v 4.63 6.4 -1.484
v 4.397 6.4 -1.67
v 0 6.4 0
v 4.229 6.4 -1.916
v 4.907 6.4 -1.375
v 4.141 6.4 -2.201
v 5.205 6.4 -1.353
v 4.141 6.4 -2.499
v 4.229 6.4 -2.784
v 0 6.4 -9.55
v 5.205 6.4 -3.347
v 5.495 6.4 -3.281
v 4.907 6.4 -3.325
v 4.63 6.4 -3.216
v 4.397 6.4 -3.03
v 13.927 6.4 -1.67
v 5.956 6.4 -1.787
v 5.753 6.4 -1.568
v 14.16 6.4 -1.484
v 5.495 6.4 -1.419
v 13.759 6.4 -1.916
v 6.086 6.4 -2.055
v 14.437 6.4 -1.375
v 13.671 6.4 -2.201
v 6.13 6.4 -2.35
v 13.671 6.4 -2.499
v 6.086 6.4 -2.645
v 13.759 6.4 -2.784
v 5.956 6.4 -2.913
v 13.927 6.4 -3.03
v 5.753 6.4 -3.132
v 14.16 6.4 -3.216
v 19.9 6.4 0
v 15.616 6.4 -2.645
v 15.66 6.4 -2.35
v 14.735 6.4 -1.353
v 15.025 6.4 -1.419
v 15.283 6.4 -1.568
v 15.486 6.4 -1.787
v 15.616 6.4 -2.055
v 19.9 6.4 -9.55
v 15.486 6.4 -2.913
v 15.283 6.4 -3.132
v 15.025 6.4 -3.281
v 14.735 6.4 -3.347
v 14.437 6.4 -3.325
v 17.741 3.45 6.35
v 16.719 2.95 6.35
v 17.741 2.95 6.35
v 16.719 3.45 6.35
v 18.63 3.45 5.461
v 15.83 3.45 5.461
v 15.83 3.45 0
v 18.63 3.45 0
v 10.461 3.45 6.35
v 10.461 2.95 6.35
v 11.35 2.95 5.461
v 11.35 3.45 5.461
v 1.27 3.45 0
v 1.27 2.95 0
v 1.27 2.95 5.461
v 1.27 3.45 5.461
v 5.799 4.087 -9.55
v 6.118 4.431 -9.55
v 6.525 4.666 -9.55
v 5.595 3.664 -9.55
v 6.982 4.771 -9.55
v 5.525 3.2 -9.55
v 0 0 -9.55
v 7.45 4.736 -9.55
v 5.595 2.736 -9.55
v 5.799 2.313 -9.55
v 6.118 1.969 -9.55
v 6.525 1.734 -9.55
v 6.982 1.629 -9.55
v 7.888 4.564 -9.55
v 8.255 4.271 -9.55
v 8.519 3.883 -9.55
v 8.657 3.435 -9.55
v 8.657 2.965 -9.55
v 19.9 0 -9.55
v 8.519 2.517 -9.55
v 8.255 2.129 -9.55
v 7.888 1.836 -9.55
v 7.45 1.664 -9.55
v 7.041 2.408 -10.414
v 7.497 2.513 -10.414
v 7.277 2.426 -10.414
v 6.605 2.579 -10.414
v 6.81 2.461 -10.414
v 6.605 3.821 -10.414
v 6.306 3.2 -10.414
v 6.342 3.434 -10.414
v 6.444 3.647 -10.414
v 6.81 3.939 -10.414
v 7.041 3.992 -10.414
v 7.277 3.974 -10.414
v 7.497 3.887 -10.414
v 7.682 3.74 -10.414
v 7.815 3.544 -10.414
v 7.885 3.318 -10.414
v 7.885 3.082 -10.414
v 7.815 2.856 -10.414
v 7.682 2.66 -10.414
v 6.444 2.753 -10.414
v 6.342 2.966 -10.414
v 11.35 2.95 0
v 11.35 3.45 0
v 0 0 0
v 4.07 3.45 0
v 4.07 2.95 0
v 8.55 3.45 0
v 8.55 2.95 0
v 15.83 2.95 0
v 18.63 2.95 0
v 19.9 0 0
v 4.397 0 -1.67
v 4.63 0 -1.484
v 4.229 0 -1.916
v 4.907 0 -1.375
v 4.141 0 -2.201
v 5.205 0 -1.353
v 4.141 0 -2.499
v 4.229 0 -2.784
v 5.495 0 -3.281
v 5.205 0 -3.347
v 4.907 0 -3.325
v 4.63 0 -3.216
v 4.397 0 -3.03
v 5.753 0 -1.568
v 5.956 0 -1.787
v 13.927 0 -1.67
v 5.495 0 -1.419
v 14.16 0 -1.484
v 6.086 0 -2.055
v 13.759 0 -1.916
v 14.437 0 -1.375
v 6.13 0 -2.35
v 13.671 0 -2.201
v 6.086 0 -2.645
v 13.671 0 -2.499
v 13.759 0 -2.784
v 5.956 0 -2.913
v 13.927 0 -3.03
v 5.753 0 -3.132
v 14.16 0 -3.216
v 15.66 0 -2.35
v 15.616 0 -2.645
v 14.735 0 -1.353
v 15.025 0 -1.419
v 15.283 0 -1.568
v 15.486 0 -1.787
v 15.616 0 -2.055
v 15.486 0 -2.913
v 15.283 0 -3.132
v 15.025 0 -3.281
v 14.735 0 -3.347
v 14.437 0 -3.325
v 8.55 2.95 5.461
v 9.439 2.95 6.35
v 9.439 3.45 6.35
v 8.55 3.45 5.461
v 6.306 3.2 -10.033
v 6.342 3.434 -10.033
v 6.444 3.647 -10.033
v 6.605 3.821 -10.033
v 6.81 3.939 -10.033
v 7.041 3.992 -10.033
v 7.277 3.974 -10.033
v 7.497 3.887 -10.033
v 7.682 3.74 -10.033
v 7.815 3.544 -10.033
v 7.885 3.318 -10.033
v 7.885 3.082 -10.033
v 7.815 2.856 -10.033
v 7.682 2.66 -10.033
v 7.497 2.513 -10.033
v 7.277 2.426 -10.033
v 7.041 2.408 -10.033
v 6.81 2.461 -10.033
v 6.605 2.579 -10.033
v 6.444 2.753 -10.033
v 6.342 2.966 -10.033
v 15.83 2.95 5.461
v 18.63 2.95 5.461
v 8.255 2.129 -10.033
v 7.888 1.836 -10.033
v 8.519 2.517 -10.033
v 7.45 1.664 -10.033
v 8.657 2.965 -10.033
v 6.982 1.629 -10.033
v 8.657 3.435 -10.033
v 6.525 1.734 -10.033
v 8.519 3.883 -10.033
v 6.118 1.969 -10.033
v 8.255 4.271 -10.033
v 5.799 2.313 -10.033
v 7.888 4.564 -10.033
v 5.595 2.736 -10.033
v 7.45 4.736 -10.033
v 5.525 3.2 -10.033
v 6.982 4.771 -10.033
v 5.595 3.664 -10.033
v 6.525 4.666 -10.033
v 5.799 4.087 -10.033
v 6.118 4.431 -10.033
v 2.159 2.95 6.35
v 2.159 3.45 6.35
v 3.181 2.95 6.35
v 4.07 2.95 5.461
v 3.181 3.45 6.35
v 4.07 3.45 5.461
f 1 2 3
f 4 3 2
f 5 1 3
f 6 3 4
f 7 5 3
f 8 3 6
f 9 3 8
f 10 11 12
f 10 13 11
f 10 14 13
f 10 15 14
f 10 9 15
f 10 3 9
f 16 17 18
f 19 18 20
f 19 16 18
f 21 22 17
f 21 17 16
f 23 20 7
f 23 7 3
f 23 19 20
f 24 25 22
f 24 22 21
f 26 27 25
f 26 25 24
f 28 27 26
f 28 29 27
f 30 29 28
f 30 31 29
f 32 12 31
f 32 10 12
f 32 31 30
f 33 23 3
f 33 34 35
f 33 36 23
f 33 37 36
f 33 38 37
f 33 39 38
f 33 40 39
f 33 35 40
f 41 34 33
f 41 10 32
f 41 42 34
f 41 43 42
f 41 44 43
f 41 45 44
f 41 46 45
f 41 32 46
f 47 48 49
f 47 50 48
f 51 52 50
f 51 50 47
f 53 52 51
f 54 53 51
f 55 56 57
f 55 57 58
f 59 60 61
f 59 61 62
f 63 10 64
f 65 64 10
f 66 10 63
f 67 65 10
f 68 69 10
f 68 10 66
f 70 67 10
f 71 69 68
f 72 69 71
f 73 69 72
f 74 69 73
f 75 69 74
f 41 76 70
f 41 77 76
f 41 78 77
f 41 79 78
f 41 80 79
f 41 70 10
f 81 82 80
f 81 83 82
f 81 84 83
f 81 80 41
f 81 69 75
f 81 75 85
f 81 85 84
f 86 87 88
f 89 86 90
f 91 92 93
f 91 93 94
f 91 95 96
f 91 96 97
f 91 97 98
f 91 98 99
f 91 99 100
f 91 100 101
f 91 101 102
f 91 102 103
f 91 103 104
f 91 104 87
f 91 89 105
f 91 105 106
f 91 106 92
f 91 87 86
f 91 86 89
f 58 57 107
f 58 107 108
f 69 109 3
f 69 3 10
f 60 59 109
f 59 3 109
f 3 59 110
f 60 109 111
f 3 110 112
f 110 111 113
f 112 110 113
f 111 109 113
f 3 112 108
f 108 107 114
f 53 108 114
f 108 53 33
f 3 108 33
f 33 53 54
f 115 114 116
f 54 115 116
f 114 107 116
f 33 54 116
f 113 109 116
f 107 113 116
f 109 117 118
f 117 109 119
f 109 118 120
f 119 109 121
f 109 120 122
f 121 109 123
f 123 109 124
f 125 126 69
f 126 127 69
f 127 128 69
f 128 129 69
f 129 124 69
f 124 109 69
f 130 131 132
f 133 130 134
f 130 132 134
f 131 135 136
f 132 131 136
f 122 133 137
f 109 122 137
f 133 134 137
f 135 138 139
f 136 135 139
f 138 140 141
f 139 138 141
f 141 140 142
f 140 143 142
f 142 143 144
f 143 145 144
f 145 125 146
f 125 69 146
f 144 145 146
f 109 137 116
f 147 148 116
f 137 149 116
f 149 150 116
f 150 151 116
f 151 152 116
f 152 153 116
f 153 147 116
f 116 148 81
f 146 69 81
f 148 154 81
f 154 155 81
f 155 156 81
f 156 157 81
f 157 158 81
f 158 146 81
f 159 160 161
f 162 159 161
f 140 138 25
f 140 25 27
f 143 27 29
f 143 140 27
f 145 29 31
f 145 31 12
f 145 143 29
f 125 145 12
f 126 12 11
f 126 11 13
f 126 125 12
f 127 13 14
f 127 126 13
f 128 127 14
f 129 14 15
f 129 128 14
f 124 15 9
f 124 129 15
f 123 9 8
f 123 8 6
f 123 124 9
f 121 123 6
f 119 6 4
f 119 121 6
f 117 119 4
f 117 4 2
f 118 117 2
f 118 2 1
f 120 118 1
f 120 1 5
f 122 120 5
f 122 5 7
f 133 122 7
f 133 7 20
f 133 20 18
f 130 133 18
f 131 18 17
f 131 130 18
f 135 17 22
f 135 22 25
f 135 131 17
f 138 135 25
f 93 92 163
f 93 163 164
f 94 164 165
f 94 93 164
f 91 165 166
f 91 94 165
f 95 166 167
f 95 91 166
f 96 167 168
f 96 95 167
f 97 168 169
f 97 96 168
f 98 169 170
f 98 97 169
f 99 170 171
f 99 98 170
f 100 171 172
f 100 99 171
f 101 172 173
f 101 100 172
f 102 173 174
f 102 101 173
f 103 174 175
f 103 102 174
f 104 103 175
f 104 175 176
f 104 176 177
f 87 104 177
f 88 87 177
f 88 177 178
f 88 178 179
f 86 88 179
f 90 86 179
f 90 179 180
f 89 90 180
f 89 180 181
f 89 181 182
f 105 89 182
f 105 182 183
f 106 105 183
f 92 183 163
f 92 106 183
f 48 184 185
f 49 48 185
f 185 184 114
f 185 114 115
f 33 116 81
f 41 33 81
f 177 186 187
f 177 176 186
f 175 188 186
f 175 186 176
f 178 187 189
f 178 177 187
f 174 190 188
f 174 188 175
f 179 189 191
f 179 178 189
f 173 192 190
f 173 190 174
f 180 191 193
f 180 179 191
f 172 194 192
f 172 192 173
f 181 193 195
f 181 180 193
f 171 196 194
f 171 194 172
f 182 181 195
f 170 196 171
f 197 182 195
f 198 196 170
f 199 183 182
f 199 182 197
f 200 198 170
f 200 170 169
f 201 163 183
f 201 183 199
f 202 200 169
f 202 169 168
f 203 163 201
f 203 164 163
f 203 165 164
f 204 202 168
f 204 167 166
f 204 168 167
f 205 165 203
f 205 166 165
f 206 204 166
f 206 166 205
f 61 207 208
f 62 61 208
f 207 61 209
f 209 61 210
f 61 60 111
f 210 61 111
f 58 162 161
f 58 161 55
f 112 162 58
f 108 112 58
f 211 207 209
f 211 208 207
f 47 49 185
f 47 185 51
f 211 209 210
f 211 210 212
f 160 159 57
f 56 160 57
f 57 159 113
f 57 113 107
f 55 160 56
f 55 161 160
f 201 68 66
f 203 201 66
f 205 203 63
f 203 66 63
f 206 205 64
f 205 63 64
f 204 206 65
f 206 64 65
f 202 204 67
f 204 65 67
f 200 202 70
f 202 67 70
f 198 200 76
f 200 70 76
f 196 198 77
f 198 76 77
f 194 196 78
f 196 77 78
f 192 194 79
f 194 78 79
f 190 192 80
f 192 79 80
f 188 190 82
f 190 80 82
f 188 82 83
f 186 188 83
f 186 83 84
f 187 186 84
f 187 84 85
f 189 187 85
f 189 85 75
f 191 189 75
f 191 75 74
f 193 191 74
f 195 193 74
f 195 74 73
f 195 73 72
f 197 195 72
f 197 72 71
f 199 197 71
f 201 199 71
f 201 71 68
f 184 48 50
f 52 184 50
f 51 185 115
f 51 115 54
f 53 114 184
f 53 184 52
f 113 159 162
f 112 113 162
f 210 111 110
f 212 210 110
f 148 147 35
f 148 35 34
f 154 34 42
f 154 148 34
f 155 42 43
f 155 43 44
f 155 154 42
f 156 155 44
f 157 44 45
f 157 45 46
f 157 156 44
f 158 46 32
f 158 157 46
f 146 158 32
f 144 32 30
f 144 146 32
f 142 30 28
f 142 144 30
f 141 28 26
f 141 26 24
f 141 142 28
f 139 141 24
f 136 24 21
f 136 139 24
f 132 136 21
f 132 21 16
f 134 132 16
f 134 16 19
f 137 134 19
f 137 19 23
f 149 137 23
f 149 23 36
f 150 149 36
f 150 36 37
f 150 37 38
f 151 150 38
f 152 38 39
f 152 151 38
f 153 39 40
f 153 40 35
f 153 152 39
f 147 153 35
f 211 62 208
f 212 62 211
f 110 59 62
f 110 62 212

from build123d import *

# Parameters (mm, degrees)
SKETCH1_W           = 19.9
SKETCH1_H           = 9.55
SKETCH1_R           = 1
BOSS_EXTRUDE1_DEPTH = 6.4
SKETCH2_R           = 1.575054
BOSS_EXTRUDE2_DEPTH = 0.8636
SKETCH3_R           = 1.575054
SKETCH3_R_2         = 0.79375
CUT_EXTRUDE1_DEPTH  = 0.381
SKETCH4_W           = 2.8
SKETCH4_H           = 0.5
BOSS_EXTRUDE3_DEPTH = 6.35
CHAMFER1_SIZE       = 0.889


with BuildPart() as part:
    # Sketch1 → Boss-Extrude1 (new body)
    with BuildSketch(Plane(origin=(0, 0, 0), x_dir=(1, 0, 0), z_dir=(0, 1, 0))):
        with Locations((9.95, 4.775)):
            Rectangle(SKETCH1_W, SKETCH1_H)
        with Locations((5.13, 2.35)):
            Circle(SKETCH1_R, mode=Mode.SUBTRACT)
        with Locations((14.66, 2.35)):
            Circle(SKETCH1_R, mode=Mode.SUBTRACT)
    extrude(amount=BOSS_EXTRUDE1_DEPTH)

    # Sketch2 → Boss-Extrude2 (add)
    with BuildSketch(Plane(origin=(0, 0, -9.55), x_dir=(-1, 0, 0), z_dir=(0, 0, -1))):
        with Locations((-7.1, 3.2)):
            Circle(SKETCH2_R)
    extrude(amount=BOSS_EXTRUDE2_DEPTH)

    # Sketch3 → Cut-Extrude1 (cut)
    with BuildSketch(Plane(origin=(0, 0, -10.4136), x_dir=(-1, 0, 0), z_dir=(0, 0, -1))):
        with Locations((-7.1, 3.2)):
            Circle(SKETCH3_R)
        with Locations((-7.1, 3.2)):
            Circle(SKETCH3_R_2, mode=Mode.SUBTRACT)
    extrude(amount=-CUT_EXTRUDE1_DEPTH, mode=Mode.SUBTRACT)

    # Sketch4 → Boss-Extrude3 (add)
    with BuildSketch(Plane.XY):
        with Locations((2.67, 3.2)):
            Rectangle(SKETCH4_W, SKETCH4_H)
        with Locations((9.95, 3.2)):
            Rectangle(SKETCH4_W, SKETCH4_H)
        with Locations((17.23, 3.2)):
            Rectangle(SKETCH4_W, SKETCH4_H)
    extrude(amount=BOSS_EXTRUDE3_DEPTH)

    # Chamfer1
    chamfer1_edges = [part.edges().sort_by_distance(p)[0] for p in [
        (1.27, 3.2, 6.35),
        (4.07, 3.2, 6.35),
        (8.55, 3.2, 6.35),
        (11.35, 3.2, 6.35),
        (15.83, 3.2, 6.35),
        (18.63, 3.2, 6.35),
    ]]
    chamfer(chamfer1_edges, length=CHAMFER1_SIZE)


solid = part.part
